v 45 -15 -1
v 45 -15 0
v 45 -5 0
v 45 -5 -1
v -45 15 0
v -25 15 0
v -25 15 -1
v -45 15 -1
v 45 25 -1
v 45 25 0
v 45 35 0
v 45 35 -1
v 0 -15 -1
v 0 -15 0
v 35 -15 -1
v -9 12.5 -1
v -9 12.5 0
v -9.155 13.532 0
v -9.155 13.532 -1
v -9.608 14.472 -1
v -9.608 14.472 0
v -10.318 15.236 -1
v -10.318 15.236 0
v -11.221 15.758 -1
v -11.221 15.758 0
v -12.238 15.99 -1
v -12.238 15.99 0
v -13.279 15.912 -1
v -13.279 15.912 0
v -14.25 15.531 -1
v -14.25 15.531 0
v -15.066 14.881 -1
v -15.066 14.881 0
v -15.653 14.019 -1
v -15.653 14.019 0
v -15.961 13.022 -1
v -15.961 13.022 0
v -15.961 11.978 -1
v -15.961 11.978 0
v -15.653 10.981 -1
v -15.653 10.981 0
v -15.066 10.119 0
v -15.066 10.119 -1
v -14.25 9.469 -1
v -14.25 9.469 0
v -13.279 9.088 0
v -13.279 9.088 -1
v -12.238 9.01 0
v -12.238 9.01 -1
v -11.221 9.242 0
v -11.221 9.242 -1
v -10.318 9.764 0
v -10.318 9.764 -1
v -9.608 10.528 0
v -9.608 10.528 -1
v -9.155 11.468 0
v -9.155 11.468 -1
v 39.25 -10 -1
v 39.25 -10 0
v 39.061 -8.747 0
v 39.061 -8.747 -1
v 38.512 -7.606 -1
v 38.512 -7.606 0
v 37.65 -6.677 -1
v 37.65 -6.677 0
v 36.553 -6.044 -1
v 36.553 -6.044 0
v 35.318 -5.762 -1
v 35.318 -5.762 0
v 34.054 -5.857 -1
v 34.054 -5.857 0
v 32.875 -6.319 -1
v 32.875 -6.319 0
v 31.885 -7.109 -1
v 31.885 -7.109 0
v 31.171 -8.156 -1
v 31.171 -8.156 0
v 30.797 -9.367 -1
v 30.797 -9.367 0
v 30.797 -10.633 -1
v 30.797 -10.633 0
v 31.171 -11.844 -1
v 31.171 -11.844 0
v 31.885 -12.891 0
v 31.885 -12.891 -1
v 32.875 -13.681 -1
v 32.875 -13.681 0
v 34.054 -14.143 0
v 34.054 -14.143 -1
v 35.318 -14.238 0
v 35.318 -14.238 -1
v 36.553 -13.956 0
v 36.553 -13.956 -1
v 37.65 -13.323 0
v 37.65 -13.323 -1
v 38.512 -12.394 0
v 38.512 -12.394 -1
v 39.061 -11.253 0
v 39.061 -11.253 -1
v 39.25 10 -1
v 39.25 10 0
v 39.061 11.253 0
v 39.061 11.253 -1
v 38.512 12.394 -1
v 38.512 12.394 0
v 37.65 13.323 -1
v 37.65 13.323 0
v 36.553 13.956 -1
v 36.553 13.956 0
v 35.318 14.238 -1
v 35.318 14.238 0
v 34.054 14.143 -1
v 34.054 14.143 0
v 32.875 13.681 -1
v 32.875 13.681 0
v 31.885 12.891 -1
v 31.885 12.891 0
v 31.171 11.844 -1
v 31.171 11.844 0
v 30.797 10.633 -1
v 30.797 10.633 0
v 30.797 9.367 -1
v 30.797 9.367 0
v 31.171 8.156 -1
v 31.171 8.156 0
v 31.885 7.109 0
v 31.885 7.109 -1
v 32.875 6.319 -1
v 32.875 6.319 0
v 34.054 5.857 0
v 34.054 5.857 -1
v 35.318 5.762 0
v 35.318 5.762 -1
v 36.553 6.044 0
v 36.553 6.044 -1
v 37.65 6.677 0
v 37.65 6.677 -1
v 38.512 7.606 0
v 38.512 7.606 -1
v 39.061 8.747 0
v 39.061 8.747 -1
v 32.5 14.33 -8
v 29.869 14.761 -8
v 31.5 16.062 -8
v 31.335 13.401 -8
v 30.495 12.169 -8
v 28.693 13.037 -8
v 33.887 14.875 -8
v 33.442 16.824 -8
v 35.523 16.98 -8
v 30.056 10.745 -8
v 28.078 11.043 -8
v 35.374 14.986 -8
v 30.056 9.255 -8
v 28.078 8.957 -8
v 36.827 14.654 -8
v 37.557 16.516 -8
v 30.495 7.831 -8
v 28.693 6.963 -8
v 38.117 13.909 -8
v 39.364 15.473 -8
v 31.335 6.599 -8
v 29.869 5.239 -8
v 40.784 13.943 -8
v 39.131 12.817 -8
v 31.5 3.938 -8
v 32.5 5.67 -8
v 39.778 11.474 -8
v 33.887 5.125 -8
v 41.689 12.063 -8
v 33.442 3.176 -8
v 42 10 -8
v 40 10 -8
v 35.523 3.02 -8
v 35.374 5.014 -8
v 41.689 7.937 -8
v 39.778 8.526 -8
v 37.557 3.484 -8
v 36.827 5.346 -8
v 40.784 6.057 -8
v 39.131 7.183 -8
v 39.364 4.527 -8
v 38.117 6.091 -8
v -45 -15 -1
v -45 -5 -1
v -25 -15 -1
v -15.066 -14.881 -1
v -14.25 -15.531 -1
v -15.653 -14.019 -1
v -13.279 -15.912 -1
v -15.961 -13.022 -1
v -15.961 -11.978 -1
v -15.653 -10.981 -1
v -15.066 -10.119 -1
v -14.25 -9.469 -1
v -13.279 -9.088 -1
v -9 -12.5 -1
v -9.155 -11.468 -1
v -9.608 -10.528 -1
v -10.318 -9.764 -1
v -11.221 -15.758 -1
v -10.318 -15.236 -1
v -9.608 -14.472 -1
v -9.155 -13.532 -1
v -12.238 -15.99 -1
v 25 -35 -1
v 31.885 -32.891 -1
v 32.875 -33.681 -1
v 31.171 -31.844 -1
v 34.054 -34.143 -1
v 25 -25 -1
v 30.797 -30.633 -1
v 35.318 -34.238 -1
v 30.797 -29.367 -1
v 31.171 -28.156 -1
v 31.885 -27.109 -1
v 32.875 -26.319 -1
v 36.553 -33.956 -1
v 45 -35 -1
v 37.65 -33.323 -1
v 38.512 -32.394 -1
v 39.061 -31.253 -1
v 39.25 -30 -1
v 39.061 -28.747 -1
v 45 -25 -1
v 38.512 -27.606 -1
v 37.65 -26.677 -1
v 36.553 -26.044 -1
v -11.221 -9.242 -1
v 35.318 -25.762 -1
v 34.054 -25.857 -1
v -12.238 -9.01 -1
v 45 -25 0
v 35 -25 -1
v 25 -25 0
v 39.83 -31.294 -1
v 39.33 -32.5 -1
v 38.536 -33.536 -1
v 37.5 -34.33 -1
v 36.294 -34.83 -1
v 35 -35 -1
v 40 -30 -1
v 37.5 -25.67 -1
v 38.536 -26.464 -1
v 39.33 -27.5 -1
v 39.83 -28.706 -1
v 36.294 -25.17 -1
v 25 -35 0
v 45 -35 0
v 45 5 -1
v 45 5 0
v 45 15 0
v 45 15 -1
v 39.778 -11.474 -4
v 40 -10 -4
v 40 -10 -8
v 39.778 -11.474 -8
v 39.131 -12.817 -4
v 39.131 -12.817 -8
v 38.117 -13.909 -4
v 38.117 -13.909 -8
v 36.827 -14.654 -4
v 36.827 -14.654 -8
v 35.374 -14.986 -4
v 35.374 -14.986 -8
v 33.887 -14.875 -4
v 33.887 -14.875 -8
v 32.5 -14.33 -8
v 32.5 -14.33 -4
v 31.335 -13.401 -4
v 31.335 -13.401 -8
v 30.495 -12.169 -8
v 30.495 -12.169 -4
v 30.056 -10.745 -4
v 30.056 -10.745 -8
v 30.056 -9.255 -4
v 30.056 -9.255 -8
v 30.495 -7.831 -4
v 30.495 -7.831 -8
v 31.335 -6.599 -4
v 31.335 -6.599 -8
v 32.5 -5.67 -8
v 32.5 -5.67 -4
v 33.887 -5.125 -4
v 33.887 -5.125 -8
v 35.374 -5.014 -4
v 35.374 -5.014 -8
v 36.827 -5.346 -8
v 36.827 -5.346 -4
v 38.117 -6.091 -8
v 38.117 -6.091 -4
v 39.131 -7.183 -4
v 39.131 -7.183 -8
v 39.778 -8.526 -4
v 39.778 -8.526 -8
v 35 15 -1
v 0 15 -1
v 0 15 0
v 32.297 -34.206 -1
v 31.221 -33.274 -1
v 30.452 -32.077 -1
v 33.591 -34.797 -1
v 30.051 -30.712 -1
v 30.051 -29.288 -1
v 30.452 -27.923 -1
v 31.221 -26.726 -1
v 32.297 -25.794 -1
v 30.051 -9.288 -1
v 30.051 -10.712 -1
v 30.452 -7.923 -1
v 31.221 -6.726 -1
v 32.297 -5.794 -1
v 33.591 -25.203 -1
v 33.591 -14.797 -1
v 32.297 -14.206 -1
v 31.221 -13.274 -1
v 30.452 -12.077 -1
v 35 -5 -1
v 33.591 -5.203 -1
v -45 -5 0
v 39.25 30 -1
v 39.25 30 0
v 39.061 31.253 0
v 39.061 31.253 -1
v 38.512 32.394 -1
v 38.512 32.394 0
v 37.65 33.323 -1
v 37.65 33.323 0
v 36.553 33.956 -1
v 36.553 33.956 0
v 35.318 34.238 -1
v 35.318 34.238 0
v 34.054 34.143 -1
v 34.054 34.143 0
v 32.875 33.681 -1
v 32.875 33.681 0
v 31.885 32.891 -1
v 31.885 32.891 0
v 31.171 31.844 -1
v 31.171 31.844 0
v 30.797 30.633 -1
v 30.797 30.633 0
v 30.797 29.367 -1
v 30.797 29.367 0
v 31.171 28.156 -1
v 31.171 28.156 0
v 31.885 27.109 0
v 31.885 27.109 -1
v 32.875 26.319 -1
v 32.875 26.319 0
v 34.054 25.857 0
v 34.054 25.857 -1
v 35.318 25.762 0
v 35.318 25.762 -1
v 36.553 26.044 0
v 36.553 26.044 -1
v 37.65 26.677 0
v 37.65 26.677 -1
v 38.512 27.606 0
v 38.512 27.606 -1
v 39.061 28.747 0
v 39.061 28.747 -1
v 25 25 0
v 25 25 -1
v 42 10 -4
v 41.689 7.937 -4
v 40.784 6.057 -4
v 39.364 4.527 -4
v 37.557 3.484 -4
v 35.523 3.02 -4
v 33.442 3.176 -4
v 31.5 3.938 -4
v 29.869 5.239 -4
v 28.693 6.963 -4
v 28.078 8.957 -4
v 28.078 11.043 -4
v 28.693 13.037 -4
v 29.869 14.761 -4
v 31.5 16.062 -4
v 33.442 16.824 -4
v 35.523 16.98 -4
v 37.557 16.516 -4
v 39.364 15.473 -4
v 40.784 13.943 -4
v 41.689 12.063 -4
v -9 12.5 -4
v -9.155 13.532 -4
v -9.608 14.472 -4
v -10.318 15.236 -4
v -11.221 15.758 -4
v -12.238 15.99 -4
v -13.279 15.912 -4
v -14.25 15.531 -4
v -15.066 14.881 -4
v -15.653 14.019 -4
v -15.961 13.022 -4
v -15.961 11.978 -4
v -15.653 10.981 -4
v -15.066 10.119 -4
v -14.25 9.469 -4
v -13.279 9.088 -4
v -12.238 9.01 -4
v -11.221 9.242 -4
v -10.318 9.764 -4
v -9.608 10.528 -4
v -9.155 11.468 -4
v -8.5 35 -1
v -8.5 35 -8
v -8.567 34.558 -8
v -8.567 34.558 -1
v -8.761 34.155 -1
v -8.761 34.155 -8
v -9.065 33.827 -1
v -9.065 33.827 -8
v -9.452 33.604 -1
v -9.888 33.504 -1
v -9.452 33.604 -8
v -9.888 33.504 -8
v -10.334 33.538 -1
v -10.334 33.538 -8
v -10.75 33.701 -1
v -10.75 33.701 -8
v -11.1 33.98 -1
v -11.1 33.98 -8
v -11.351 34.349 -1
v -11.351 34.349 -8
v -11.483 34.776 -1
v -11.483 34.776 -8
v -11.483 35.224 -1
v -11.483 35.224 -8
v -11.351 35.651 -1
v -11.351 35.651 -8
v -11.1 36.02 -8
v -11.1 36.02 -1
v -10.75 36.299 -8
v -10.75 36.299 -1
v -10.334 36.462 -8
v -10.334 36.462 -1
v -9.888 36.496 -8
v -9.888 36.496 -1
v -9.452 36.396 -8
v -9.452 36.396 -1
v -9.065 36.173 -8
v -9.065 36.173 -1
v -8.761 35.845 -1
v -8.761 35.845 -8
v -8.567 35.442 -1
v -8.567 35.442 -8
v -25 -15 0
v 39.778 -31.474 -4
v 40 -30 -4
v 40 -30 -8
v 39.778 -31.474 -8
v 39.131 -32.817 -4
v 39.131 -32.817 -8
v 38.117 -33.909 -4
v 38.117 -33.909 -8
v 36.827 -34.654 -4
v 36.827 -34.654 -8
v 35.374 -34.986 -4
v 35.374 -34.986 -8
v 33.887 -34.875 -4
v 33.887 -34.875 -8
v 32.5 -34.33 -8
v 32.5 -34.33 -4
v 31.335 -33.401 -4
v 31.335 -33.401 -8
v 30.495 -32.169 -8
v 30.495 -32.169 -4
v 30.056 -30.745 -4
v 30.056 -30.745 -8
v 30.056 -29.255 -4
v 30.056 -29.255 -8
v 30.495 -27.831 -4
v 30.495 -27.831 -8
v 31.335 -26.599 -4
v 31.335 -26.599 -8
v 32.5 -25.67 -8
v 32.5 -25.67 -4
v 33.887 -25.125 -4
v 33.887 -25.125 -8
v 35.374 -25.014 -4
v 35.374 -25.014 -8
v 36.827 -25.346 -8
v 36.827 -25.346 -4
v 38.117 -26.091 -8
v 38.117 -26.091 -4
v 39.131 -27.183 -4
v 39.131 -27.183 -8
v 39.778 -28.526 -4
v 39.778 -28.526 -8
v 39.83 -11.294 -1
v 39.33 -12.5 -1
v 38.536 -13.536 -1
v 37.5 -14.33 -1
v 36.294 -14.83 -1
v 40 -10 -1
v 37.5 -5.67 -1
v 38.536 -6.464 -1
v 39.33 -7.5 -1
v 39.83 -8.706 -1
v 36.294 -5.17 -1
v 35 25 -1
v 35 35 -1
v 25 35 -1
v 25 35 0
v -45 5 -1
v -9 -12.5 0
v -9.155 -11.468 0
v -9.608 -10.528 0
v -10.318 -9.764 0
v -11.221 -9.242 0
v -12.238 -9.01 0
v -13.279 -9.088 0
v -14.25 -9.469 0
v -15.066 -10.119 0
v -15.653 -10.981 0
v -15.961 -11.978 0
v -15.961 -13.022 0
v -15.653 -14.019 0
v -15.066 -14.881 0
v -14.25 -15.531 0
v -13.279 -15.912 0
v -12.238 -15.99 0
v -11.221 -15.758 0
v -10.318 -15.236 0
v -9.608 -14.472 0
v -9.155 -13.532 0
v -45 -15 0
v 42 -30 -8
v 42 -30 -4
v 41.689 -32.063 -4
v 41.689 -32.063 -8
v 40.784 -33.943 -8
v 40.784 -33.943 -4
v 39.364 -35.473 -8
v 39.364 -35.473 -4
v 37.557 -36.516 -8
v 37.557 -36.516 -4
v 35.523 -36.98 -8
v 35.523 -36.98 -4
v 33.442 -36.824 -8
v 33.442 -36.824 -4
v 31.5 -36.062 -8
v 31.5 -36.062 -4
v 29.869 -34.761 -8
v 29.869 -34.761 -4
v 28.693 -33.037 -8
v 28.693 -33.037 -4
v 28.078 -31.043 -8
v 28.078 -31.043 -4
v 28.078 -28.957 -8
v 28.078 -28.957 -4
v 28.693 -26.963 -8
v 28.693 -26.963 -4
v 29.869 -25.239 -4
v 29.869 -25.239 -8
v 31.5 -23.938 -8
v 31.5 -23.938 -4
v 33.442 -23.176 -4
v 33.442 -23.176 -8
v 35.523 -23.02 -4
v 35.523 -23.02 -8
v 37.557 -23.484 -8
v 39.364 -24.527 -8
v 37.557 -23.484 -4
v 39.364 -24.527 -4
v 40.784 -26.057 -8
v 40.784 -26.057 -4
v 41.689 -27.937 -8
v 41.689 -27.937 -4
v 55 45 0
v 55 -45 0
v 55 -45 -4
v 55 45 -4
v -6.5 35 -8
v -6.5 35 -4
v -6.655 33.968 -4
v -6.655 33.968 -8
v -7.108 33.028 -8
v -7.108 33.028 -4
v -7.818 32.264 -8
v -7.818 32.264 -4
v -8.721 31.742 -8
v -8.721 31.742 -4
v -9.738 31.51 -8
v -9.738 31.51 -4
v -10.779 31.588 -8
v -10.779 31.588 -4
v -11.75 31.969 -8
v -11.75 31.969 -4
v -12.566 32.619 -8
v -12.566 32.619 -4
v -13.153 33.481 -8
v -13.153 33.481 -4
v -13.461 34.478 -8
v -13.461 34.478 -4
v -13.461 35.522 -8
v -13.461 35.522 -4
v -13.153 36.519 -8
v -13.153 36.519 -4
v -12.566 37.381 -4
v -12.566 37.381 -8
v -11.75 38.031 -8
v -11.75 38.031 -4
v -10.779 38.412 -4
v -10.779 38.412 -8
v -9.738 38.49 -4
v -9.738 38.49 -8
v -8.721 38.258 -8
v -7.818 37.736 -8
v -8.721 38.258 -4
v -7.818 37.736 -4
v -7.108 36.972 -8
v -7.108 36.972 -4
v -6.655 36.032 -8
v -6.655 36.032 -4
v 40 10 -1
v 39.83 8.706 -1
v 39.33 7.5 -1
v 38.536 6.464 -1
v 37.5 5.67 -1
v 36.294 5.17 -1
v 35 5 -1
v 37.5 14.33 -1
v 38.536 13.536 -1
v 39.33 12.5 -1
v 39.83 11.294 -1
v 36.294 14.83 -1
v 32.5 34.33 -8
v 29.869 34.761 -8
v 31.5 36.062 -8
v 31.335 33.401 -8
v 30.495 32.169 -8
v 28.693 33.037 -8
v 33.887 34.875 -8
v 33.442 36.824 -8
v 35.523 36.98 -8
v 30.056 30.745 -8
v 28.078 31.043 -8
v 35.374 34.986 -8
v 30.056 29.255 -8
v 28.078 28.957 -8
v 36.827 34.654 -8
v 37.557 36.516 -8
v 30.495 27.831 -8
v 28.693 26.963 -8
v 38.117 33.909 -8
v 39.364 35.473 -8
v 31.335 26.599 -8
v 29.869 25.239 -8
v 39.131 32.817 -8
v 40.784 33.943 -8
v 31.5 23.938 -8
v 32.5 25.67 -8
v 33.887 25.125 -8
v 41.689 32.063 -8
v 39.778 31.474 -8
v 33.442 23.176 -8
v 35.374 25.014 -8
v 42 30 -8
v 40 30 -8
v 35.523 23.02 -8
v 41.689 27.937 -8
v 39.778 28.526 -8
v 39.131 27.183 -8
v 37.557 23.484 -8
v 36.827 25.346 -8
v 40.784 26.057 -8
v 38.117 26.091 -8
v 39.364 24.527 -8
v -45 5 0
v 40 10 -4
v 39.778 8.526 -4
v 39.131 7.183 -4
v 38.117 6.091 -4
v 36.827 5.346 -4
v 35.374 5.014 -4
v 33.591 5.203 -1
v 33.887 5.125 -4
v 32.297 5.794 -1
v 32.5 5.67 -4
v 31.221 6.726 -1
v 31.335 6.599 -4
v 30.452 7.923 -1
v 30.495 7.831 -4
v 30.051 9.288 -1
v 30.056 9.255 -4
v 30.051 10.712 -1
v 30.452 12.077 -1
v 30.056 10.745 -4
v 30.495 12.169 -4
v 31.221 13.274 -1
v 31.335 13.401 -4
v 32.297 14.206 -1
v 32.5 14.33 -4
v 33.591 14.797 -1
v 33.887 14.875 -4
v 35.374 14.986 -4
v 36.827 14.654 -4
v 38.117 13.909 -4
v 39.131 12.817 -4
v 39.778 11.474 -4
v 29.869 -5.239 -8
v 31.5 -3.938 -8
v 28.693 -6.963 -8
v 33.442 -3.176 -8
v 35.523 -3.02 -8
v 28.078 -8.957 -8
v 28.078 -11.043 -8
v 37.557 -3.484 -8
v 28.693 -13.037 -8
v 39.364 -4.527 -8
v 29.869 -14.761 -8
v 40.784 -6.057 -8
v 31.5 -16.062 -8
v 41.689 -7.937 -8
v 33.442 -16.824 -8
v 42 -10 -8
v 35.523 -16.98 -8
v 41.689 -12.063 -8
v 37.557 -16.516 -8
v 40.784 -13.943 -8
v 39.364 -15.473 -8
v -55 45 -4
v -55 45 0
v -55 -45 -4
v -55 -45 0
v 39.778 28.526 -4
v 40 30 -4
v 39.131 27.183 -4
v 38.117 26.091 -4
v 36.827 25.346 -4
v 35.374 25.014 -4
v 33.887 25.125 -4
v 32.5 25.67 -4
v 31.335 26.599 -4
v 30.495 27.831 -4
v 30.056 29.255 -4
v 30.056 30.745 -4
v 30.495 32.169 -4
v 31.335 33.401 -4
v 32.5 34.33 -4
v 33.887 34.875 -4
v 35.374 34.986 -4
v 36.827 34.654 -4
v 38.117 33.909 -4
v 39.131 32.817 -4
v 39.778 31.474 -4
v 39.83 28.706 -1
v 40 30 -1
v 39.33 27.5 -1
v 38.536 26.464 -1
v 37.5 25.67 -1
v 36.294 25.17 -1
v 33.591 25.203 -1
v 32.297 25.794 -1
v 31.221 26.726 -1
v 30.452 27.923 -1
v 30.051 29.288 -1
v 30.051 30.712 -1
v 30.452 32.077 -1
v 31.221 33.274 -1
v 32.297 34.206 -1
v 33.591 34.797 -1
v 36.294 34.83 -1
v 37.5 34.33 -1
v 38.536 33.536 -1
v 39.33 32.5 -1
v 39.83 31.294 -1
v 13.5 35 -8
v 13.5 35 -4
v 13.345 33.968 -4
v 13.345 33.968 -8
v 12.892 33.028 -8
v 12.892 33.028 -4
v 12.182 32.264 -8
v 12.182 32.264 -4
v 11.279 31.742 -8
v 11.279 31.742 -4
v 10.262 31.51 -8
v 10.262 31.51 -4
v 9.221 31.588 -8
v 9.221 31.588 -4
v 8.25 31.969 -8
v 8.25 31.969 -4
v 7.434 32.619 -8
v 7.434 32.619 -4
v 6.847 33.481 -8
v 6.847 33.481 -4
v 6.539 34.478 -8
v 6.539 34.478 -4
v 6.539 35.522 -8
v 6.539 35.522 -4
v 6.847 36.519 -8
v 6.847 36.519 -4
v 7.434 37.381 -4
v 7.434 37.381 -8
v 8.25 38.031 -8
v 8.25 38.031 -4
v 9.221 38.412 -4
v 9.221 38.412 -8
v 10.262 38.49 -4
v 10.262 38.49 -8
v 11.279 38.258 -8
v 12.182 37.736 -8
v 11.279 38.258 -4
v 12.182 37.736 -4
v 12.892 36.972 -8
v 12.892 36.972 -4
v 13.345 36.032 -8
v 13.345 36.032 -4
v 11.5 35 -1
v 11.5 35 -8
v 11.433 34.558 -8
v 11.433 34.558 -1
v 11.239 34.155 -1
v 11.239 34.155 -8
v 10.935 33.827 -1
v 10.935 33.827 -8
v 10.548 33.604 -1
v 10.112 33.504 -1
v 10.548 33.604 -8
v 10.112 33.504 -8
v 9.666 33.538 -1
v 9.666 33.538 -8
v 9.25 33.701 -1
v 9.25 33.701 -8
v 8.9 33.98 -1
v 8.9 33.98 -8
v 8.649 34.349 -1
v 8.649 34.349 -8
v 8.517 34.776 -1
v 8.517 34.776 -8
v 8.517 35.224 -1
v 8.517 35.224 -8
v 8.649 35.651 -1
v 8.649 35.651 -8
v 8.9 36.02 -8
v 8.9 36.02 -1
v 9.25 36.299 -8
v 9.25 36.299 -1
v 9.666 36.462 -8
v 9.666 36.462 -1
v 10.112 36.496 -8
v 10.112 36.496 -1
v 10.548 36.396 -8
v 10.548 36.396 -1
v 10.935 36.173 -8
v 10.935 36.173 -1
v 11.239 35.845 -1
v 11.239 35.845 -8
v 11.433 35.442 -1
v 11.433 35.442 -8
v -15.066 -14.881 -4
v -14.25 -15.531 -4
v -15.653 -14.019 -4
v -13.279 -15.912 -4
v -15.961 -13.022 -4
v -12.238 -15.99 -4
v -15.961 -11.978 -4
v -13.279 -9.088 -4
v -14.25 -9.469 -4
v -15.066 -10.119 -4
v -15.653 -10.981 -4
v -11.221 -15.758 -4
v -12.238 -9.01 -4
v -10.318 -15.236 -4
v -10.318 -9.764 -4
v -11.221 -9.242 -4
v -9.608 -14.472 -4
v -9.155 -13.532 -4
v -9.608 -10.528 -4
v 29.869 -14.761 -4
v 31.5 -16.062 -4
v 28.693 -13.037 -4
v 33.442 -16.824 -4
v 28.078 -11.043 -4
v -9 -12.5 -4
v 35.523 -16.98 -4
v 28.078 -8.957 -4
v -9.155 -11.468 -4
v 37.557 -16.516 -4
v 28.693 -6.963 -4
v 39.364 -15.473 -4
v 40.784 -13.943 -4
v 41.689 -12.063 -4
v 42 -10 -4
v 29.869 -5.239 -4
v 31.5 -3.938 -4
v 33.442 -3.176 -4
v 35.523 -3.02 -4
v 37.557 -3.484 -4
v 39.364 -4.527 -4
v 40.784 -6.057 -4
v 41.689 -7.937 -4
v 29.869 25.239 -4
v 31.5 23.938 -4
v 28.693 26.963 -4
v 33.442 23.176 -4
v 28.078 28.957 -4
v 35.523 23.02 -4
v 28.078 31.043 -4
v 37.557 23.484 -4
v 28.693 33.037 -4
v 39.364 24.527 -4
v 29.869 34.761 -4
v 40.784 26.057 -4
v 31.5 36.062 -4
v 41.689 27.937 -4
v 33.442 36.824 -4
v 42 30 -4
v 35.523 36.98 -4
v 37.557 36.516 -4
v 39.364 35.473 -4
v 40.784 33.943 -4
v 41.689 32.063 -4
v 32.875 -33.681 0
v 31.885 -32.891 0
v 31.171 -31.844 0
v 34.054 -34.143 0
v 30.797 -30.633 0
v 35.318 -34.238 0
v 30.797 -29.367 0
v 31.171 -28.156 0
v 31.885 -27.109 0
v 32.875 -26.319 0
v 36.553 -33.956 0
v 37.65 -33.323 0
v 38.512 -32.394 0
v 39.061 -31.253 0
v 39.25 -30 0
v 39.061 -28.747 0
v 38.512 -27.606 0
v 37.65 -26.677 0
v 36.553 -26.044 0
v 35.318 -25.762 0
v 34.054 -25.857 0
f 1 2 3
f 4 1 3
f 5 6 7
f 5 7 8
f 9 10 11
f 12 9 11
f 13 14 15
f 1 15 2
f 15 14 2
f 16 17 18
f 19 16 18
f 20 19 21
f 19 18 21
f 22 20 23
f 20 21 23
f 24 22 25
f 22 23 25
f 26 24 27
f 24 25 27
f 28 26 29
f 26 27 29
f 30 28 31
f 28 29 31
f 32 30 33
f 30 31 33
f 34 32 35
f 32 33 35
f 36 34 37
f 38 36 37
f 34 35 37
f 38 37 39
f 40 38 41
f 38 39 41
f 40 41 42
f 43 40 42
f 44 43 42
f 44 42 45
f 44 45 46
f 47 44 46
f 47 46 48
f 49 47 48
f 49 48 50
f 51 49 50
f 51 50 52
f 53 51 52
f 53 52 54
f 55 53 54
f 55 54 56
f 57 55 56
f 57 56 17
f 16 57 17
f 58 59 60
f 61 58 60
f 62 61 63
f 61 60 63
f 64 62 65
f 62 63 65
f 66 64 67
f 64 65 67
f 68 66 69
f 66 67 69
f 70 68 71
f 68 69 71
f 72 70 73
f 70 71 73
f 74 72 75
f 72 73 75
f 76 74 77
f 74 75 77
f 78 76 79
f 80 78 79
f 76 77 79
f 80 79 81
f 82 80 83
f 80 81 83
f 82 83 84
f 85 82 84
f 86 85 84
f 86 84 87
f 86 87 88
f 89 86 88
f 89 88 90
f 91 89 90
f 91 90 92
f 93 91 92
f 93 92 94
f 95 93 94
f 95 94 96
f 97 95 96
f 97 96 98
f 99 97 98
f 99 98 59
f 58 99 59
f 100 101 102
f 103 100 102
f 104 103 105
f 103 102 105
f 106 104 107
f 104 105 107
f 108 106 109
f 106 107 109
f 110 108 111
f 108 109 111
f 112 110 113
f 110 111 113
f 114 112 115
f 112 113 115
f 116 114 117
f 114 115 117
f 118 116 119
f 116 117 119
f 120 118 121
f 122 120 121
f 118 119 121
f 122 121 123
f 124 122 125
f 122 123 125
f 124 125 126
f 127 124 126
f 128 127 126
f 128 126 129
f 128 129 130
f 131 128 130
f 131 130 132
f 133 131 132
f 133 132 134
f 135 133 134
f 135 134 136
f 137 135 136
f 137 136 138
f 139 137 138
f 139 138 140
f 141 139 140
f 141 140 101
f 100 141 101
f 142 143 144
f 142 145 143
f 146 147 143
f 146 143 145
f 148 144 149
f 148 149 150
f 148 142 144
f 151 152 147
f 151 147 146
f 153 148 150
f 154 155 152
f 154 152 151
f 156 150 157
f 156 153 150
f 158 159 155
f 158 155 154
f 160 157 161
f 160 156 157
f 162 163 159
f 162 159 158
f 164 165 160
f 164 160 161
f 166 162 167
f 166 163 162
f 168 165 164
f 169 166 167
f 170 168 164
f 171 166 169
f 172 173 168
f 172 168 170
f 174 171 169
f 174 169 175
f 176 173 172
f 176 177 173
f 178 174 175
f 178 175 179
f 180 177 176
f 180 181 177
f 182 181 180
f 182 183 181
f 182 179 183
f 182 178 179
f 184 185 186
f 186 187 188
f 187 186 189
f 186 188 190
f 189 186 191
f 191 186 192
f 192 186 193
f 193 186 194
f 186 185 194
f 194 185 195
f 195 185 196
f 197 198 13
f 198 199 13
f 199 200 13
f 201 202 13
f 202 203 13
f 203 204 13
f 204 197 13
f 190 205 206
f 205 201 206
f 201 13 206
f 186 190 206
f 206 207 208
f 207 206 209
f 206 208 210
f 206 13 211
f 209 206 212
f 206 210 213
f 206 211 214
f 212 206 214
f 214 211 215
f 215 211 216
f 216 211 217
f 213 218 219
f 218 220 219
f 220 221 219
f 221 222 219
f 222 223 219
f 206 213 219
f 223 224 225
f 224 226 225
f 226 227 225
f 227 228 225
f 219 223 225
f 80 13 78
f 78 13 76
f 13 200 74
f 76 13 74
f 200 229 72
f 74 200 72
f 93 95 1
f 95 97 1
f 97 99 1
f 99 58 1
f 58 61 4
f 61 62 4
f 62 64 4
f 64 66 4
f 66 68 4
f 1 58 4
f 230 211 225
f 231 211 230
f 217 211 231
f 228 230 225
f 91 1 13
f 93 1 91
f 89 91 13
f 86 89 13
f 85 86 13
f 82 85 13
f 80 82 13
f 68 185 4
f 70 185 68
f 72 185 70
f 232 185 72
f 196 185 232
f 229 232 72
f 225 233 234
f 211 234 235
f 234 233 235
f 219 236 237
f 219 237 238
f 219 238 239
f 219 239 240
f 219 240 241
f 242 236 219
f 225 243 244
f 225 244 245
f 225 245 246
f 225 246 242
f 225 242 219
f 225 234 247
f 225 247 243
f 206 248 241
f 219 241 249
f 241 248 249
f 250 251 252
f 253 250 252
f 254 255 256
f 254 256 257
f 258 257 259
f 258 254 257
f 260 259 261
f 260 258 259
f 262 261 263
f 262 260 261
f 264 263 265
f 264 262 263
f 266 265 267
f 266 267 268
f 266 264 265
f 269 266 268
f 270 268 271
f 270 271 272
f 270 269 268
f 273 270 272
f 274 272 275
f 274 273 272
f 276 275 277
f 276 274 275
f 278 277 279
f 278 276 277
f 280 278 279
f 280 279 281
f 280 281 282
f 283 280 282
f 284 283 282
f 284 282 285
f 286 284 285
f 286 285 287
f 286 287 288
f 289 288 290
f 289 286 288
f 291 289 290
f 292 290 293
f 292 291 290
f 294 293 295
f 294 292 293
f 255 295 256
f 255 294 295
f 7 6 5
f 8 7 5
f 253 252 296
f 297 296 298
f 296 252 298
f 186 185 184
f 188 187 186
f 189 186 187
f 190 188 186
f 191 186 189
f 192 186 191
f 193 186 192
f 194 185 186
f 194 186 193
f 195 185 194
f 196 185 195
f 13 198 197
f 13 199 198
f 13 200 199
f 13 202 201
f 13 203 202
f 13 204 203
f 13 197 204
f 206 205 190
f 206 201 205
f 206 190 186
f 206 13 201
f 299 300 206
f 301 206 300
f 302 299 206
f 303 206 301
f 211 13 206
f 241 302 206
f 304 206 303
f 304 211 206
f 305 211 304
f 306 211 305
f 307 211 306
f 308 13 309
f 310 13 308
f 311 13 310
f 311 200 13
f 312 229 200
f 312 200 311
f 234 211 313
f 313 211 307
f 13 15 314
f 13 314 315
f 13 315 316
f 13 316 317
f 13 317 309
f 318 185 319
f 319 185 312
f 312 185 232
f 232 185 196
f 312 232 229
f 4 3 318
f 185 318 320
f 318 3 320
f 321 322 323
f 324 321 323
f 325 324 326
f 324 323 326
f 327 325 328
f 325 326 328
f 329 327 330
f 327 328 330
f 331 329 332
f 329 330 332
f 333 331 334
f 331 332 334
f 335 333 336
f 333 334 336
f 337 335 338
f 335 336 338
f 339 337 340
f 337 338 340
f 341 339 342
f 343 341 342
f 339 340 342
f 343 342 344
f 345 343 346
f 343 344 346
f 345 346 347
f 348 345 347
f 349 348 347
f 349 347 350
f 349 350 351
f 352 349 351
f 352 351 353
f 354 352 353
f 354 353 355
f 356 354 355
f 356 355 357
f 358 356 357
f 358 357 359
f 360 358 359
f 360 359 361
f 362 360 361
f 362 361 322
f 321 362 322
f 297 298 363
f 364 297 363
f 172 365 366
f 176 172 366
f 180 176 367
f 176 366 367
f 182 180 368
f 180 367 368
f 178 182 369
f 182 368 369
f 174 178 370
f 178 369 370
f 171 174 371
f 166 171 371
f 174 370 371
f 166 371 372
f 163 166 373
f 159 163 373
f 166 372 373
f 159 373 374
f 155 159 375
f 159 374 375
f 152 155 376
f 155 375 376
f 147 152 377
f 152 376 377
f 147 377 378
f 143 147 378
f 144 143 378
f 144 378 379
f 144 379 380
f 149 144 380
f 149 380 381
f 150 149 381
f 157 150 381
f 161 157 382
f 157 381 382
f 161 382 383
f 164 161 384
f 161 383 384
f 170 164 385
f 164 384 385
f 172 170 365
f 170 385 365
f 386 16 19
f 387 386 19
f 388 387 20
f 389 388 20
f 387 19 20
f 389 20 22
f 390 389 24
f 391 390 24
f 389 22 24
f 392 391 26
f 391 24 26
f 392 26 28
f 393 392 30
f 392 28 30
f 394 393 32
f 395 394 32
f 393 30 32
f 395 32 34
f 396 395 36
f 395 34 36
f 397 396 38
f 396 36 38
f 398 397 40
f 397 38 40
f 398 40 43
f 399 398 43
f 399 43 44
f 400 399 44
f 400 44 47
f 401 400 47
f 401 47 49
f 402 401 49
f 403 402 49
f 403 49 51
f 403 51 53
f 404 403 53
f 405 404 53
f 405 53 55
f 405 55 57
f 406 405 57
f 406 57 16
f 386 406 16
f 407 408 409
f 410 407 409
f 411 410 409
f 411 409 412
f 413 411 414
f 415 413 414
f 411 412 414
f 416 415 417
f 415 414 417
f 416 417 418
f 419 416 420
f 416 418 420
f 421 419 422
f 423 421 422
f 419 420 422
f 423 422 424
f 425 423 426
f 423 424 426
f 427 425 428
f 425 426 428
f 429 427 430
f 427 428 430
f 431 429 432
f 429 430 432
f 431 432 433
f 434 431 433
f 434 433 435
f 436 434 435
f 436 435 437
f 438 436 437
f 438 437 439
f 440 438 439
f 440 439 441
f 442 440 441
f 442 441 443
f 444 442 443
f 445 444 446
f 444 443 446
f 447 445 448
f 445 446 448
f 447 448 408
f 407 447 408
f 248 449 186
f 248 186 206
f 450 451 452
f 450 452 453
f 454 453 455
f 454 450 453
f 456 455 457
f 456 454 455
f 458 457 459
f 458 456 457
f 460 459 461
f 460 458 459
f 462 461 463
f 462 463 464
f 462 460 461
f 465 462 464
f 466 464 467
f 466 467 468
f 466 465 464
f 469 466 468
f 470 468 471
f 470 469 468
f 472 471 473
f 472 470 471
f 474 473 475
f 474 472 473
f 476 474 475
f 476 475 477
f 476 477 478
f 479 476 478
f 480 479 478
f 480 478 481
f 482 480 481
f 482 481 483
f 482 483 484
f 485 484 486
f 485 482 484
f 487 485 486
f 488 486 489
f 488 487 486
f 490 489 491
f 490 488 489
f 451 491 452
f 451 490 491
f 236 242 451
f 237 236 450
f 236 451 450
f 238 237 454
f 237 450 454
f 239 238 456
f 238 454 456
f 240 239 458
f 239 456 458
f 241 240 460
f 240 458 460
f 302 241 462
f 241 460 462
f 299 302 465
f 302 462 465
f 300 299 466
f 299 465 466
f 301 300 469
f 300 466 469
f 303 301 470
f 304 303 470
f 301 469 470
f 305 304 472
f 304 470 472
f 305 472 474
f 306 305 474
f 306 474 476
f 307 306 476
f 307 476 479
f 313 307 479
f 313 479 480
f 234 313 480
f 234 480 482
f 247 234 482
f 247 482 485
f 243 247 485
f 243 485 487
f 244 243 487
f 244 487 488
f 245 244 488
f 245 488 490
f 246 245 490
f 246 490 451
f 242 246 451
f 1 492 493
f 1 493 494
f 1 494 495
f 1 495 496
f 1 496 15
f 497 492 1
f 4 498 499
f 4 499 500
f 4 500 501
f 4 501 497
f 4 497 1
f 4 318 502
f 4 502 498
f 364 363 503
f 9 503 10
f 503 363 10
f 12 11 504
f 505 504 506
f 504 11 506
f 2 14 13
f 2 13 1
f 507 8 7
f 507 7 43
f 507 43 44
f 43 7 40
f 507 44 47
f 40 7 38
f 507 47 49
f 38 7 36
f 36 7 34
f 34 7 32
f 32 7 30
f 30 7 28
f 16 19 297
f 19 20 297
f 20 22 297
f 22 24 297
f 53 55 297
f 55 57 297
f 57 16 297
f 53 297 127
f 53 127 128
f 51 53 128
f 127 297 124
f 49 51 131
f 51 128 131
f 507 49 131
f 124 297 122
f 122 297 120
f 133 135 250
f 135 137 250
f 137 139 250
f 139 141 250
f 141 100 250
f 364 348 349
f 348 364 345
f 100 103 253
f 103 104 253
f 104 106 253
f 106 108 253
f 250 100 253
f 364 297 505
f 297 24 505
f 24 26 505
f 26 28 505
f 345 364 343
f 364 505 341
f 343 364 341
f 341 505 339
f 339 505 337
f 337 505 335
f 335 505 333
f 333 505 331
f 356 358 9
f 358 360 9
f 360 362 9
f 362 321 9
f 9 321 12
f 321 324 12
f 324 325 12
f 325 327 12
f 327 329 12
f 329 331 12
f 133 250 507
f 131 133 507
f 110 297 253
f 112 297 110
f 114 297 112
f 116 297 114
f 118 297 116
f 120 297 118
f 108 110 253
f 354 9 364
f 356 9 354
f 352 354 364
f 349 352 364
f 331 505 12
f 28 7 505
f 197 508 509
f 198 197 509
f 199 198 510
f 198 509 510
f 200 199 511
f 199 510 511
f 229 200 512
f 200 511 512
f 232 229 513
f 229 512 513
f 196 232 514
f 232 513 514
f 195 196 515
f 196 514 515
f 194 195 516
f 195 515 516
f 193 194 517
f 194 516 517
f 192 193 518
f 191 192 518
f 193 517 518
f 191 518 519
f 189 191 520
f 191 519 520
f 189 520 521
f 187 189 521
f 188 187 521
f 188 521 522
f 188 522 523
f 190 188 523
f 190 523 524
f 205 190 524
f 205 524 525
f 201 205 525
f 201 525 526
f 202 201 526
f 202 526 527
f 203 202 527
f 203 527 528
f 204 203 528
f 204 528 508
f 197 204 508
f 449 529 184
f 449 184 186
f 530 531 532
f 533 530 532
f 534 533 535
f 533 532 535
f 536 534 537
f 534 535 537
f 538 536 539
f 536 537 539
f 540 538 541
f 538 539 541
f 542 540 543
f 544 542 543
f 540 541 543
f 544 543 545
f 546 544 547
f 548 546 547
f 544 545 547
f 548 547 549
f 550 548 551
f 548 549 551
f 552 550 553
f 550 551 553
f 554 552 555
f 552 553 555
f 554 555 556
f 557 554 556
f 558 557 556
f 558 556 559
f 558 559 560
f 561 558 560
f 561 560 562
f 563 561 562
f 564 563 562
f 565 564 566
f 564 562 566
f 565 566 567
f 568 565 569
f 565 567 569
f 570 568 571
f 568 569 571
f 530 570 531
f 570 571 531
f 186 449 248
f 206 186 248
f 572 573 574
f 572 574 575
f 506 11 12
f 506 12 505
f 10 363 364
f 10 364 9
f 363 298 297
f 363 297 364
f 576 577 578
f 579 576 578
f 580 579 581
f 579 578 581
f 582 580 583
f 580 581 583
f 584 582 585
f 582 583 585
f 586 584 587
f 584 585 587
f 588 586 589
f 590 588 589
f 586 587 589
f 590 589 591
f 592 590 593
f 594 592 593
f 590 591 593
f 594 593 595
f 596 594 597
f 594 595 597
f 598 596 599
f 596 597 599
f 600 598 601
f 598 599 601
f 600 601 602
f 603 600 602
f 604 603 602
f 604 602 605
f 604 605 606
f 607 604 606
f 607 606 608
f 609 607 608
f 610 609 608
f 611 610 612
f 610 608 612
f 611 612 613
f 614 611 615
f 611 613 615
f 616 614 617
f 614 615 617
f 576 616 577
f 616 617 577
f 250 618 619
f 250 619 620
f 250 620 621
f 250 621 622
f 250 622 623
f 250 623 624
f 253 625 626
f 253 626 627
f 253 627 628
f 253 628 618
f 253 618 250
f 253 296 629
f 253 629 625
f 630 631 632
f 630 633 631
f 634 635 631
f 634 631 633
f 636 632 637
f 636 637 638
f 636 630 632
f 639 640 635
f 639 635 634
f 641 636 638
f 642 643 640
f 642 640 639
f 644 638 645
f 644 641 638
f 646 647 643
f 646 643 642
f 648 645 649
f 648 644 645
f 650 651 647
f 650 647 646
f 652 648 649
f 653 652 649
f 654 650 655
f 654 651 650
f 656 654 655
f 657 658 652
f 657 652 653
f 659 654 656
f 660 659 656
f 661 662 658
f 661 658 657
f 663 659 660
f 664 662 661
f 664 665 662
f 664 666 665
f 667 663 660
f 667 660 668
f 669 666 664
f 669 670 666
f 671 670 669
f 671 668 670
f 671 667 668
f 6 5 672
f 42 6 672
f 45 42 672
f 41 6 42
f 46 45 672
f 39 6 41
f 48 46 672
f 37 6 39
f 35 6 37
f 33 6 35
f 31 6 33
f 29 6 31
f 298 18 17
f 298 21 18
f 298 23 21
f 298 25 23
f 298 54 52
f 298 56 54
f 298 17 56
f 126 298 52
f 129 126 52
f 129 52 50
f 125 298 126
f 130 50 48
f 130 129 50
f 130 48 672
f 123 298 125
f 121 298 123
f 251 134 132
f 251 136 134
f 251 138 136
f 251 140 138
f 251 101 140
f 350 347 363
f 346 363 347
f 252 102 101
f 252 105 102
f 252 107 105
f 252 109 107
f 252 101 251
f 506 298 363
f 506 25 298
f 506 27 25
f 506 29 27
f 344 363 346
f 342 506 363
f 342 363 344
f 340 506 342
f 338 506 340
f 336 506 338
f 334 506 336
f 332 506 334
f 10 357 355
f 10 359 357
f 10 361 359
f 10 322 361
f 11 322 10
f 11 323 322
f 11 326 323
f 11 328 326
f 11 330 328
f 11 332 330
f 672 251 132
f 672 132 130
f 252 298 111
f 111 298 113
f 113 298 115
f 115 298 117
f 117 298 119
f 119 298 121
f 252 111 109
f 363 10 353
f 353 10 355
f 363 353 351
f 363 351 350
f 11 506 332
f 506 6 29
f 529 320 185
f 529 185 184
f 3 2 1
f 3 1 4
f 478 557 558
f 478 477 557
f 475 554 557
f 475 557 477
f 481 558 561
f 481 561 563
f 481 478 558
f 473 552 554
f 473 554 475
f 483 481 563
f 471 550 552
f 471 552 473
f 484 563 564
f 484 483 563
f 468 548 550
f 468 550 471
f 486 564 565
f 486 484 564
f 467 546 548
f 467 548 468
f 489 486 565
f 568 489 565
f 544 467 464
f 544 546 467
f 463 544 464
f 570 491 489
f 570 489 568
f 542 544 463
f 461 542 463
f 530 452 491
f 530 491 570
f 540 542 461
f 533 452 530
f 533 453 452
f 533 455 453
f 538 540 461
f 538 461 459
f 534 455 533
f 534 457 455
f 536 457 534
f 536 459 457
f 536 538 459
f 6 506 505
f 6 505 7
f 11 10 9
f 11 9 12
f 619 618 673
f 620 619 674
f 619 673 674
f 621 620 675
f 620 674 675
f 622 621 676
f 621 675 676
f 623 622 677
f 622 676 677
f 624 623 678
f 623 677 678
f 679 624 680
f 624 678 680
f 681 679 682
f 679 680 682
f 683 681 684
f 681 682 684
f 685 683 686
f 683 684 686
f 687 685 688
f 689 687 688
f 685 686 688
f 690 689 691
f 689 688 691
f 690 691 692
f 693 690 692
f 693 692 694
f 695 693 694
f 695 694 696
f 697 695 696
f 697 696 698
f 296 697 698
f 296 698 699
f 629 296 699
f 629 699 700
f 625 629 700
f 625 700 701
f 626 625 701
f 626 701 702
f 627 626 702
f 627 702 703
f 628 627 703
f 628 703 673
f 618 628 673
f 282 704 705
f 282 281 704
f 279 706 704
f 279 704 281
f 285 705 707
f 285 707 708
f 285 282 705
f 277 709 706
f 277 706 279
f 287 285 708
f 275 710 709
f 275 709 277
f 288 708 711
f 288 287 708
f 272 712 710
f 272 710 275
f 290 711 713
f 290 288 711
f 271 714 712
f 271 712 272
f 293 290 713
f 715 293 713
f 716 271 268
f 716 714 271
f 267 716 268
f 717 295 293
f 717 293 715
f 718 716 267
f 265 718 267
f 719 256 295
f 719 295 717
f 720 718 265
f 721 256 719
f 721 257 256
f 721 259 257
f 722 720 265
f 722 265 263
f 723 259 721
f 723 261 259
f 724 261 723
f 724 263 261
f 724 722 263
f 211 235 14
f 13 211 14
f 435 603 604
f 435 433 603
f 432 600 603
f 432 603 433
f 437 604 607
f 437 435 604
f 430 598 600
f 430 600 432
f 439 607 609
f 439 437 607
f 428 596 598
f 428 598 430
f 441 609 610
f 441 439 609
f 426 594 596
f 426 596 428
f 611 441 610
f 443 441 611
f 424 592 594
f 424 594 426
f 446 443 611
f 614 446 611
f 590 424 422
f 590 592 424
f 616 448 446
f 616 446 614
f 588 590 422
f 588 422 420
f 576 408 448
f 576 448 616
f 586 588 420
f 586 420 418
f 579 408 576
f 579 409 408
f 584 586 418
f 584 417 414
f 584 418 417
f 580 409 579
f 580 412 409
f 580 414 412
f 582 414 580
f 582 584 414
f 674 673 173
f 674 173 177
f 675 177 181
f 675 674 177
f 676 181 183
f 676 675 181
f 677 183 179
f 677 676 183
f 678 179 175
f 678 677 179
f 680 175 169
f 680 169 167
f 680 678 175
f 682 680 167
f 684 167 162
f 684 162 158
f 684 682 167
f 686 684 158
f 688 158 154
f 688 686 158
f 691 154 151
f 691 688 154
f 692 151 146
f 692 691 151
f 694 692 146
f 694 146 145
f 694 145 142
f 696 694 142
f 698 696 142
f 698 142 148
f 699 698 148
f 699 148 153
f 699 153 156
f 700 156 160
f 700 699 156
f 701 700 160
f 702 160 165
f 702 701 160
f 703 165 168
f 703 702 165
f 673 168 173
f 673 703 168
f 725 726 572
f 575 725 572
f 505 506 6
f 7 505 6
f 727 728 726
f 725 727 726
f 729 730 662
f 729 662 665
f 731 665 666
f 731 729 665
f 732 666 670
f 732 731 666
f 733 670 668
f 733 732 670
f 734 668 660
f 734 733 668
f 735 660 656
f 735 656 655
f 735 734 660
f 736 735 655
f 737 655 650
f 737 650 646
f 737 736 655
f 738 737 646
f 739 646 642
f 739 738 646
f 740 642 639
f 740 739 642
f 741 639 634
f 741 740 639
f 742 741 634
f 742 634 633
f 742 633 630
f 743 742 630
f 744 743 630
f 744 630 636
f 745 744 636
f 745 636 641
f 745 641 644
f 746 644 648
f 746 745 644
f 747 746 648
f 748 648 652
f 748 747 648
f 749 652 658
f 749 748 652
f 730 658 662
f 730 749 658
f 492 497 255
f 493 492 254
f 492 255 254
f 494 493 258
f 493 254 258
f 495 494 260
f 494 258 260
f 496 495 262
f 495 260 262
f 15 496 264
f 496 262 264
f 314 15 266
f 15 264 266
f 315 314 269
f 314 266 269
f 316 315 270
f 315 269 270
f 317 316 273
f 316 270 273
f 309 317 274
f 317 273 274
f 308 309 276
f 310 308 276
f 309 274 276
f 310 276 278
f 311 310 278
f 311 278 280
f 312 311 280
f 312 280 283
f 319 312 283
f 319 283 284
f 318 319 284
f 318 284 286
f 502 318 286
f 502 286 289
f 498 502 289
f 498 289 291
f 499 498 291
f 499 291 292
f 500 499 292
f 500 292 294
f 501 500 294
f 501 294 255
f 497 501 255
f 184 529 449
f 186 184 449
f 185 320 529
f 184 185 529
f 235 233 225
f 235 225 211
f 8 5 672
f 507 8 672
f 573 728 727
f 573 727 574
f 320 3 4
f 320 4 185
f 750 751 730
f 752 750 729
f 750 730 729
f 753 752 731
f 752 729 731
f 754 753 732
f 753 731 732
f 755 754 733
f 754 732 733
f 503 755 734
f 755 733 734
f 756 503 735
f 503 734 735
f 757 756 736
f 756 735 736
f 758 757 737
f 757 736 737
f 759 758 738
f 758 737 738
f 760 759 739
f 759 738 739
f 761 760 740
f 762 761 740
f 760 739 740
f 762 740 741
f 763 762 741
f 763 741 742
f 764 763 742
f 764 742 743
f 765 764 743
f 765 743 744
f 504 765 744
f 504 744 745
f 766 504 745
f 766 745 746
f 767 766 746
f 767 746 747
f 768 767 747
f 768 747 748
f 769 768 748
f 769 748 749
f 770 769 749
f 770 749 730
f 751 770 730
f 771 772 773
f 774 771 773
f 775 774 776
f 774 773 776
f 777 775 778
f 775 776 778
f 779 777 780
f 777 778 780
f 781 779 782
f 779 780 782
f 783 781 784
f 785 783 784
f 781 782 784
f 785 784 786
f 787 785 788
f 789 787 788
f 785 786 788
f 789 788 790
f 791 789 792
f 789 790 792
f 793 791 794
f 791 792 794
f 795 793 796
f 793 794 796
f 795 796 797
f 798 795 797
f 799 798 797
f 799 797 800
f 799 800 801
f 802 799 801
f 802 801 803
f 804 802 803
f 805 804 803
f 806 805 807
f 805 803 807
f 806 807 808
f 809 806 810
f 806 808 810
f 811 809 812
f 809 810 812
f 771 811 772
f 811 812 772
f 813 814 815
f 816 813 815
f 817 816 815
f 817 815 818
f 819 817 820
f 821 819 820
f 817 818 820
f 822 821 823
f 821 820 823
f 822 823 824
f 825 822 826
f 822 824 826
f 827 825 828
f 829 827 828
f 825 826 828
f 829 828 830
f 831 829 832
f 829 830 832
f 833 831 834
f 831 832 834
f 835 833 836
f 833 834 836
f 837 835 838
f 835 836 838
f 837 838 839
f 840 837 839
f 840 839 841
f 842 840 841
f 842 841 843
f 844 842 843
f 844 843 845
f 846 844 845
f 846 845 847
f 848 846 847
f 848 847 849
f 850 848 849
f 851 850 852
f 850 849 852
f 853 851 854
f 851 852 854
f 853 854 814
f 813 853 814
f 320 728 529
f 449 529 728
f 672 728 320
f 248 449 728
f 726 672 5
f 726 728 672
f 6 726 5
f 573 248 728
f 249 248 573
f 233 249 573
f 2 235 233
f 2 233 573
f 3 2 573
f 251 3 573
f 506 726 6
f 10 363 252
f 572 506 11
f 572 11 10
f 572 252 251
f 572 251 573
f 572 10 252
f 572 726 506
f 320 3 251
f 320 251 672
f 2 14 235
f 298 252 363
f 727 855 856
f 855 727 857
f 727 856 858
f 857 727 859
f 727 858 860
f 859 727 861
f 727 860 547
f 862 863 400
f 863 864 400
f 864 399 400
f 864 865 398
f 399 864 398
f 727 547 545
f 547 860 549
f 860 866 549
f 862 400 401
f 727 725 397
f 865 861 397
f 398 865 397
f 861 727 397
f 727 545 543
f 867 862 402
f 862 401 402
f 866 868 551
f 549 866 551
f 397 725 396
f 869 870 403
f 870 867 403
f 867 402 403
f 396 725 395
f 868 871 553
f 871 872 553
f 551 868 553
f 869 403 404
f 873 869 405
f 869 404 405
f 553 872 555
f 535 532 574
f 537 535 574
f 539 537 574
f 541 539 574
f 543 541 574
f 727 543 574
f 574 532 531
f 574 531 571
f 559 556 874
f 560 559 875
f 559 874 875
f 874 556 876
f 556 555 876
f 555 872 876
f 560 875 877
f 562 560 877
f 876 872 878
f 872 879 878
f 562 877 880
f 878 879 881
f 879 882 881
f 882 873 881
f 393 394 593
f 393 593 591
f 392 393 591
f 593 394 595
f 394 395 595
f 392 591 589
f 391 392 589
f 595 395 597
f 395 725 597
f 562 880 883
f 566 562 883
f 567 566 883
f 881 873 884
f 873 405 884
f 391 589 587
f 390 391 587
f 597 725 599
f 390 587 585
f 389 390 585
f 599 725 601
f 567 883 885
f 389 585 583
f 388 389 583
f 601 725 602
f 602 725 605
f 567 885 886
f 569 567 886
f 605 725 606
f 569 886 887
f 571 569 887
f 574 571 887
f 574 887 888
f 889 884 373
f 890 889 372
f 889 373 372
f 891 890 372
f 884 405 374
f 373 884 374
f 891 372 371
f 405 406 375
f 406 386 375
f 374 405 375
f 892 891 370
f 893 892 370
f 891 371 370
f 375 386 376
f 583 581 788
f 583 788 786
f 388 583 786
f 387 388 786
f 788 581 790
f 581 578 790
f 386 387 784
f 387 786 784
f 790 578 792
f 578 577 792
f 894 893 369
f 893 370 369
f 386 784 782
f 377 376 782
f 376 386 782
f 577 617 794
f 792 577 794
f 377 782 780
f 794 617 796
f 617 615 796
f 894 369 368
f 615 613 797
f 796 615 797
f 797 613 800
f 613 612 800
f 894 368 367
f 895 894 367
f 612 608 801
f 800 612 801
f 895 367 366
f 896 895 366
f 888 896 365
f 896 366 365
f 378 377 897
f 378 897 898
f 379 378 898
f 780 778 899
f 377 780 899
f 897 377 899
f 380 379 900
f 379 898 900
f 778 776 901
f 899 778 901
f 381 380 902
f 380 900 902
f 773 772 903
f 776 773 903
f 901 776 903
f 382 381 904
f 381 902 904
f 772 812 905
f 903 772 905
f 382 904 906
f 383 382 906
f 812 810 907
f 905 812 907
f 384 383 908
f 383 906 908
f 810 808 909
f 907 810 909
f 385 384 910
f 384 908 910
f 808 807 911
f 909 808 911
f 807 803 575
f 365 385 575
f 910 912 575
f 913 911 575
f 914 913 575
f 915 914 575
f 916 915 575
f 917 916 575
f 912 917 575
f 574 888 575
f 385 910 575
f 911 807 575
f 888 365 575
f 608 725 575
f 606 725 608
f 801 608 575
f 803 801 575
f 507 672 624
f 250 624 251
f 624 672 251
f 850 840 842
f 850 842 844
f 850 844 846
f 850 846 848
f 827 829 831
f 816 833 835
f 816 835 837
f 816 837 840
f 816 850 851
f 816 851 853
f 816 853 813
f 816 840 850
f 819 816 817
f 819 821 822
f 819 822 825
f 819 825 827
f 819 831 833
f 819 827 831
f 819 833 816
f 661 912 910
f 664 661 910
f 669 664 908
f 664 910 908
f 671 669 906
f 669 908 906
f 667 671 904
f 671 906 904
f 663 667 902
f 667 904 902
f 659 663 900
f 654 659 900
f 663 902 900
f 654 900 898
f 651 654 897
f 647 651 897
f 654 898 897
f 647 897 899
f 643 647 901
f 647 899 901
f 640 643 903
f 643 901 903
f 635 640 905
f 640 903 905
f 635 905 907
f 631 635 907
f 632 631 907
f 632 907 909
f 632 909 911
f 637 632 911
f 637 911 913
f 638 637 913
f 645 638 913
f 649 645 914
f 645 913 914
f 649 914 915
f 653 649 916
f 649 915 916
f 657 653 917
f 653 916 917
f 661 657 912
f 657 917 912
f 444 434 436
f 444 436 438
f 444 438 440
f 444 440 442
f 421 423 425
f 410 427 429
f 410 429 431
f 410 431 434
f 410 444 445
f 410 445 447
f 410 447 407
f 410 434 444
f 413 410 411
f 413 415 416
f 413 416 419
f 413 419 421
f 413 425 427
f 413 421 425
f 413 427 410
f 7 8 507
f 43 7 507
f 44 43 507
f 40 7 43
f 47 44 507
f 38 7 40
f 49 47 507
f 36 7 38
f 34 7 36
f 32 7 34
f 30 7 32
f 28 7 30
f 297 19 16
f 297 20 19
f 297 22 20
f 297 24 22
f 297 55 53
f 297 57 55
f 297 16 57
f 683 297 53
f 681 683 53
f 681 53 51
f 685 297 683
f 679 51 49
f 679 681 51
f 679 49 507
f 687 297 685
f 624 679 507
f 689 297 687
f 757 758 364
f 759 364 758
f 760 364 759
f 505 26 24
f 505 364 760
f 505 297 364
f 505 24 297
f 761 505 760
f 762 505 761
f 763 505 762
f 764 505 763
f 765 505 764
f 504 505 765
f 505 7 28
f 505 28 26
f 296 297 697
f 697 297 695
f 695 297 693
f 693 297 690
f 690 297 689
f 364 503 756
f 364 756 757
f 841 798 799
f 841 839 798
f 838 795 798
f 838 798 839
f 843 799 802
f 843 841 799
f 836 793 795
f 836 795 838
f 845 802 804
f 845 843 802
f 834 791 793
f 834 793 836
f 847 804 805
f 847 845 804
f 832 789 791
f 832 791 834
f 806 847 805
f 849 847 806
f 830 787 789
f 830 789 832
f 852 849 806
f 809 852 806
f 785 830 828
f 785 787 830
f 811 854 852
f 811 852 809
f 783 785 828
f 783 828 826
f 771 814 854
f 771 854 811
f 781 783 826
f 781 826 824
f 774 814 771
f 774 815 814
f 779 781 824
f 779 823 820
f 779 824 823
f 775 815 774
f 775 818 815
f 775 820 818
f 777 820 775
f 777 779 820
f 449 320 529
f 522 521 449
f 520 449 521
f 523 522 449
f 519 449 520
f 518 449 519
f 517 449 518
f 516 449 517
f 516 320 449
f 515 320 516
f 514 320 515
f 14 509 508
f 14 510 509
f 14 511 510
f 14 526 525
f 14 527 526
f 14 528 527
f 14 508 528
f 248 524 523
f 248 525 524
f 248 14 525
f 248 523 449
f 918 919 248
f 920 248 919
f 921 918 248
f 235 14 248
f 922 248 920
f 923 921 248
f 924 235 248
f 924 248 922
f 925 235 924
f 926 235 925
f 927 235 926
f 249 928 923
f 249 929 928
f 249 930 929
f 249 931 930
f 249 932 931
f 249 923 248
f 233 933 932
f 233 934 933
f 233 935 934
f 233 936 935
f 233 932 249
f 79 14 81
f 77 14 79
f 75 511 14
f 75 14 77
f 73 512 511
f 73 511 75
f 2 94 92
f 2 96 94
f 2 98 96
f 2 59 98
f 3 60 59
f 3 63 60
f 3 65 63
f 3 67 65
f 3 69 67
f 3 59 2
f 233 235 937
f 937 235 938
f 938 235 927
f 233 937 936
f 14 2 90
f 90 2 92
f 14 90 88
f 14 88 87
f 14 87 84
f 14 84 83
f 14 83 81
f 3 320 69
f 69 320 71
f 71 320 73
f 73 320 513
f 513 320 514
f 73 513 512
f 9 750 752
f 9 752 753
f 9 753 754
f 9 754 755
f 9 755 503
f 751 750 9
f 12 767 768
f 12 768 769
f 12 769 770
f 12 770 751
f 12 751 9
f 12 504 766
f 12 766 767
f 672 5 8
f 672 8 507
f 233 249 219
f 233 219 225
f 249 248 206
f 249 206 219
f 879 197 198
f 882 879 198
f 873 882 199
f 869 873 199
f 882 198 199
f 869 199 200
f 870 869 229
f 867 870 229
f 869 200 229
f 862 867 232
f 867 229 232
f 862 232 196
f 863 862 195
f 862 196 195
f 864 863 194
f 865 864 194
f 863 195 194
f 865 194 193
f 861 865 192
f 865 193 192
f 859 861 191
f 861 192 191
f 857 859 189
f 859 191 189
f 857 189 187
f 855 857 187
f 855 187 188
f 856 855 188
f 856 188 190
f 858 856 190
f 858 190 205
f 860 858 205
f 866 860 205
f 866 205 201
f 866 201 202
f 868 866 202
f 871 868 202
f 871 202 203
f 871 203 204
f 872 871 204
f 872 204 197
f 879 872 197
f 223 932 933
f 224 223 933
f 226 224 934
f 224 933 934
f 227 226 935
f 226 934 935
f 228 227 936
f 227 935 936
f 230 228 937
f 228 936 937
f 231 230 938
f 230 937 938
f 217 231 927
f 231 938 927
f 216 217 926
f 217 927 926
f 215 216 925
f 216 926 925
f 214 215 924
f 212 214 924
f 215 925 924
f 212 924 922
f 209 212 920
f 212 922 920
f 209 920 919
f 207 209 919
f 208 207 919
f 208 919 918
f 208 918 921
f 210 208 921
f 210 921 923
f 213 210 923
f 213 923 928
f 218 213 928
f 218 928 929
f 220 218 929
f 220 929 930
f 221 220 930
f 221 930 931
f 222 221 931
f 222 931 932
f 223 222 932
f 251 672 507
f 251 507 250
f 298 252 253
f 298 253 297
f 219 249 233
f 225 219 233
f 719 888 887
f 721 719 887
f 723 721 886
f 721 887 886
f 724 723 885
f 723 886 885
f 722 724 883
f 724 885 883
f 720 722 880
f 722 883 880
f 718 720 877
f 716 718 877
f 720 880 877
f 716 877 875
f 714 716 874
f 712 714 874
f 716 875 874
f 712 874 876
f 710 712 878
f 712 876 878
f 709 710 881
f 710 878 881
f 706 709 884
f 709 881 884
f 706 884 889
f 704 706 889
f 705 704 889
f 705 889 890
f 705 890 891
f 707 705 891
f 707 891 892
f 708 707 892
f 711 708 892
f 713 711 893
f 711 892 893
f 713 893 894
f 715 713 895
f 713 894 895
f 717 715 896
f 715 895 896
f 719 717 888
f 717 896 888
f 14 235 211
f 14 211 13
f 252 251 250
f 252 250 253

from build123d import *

# Parameters (mm, degrees)
F0_W      = 110
F0_H      = 90
F1_DEPTH  = 4
F5_DEPTH  = 1
F6_DEPTH  = 1
F4_R      = 3.5
F4_R_2    = 4.25
F7_DEPTH  = 4
F8_R      = 5
F9_DEPTH  = 3
F10_R     = 7
F10_R_2   = 5
F11_DEPTH = 4
F12_R     = 3.5
F13_DEPTH = 4
F15_R     = 1.5
F16_DEPTH = 7


with BuildPart() as f1:
    # F0 (on Top) → F1 (new body)
    with BuildSketch(Plane.XY):
        Rectangle(F0_W, F0_H)
    extrude(amount=-F1_DEPTH)

    # F3 (on Top) → F5 (cut)
    with BuildSketch(Plane.XY):
        Polygon((-25, 15), (-45, 15), (-45, 5), (45, 5), (45, 15), (0, 15), (25, 25), (45, 25), (45, 35), (25, 35), align=None)
        Polygon((45, -25), (25, -25), (0, -15), (45, -15), (45, -5), (-45, -5), (-45, -15), (-25, -15), (25, -35), (45, -35), align=None)
    extrude(amount=-F5_DEPTH, mode=Mode.SUBTRACT)


with BuildPart() as f6:
    # F3 (on Top) → F6 (new body)
    with BuildSketch(Plane.XY):
        Polygon((-25, 15), (-45, 15), (-45, 5), (45, 5), (45, 15), (0, 15), (25, 25), (45, 25), (45, 35), (25, 35), align=None)
    extrude(amount=-F6_DEPTH)


with BuildPart() as f6b:
    # F3 (on Top) → F6, piece 2 (new body)
    with BuildSketch(Plane.XY):
        Polygon((45, -25), (25, -25), (0, -15), (45, -15), (45, -5), (-45, -5), (-45, -15), (-25, -15), (25, -35), (45, -35), align=None)
    extrude(amount=-F6_DEPTH)


with BuildPart() as f7_tool:
    # F4 (on Top) → F7 (new body, through all)
    with BuildSketch(Plane.XY):
        with Locations((-12.5, 12.5)):
            Circle(F4_R)
        with Locations((35, 30)):
            Circle(F4_R_2)
        with Locations((35, 10)):
            Circle(F4_R_2)
        with Locations((35, -10)):
            Circle(F4_R_2)
        with Locations((35, -30)):
            Circle(F4_R_2)
        with Locations((-12.5, -12.5)):
            Circle(F4_R)
    extrude(amount=-F7_DEPTH)


with BuildPart() as f1_1:
    add(f1.part)

    # F7: cut by f7_tool
    add(f7_tool.part, mode=Mode.SUBTRACT)

    # F8 (on offset) → F9 (cut, through all)
    with BuildSketch(Plane(origin=(0, 0, -4), x_dir=(1, 0, 0), z_dir=(0, 0, -1))):
        with Locations((35, -30)):
            Circle(F8_R)
        with Locations((35, -10)):
            Circle(F8_R)
        with Locations((35, 10)):
            Circle(F8_R)
        with Locations((35, 30)):
            Circle(F8_R)
    extrude(amount=-F9_DEPTH, mode=Mode.SUBTRACT)

    # F10 (on offset) → F11 (join)
    with BuildSketch(Plane(origin=(0, 0, -4), x_dir=(1, 0, 0), z_dir=(0, 0, -1))):
        with Locations((35, -30)):
            Circle(F10_R)
        with Locations((35, -30)):
            Circle(F10_R_2, mode=Mode.SUBTRACT)
        with Locations((35.000000149, -10)):
            Circle(F10_R)
        with Locations((35.000000149, -10)):
            Circle(F10_R_2, mode=Mode.SUBTRACT)
        with Locations((35.000000149, 10)):
            Circle(F10_R)
        with Locations((35.000000149, 10)):
            Circle(F10_R_2, mode=Mode.SUBTRACT)
        with Locations((35.000000149, 30)):
            Circle(F10_R)
        with Locations((35.000000149, 30)):
            Circle(F10_R_2, mode=Mode.SUBTRACT)
    extrude(amount=F11_DEPTH)

    # F12 (on offset) → F13 (join)
    with BuildSketch(Plane(origin=(0, 0, -4), x_dir=(1, 0, 0), z_dir=(0, 0, -1))):
        with Locations((10, -35)):
            Circle(F12_R)
        with Locations((-10, -35)):
            Circle(F12_R)
    extrude(amount=F13_DEPTH)

    # F15 (on offset) → F16 (cut)
    with BuildSketch(Plane(origin=(0, 0, -8), x_dir=(1, 0, 0), z_dir=(0, 0, -1))):
        with Locations((10, -35)):
            Circle(F15_R)
        with Locations((-10, -35)):
            Circle(F15_R)
    extrude(amount=-F16_DEPTH, mode=Mode.SUBTRACT)


with BuildPart() as f6_1:
    add(f6.part)

    # F7: cut by f7_tool
    add(f7_tool.part, mode=Mode.SUBTRACT)


with BuildPart() as f6b_1:
    add(f6b.part)

    # F7: cut by f7_tool
    add(f7_tool.part, mode=Mode.SUBTRACT)


solid = Compound([f1_1.part, f6_1.part, f6b_1.part])
